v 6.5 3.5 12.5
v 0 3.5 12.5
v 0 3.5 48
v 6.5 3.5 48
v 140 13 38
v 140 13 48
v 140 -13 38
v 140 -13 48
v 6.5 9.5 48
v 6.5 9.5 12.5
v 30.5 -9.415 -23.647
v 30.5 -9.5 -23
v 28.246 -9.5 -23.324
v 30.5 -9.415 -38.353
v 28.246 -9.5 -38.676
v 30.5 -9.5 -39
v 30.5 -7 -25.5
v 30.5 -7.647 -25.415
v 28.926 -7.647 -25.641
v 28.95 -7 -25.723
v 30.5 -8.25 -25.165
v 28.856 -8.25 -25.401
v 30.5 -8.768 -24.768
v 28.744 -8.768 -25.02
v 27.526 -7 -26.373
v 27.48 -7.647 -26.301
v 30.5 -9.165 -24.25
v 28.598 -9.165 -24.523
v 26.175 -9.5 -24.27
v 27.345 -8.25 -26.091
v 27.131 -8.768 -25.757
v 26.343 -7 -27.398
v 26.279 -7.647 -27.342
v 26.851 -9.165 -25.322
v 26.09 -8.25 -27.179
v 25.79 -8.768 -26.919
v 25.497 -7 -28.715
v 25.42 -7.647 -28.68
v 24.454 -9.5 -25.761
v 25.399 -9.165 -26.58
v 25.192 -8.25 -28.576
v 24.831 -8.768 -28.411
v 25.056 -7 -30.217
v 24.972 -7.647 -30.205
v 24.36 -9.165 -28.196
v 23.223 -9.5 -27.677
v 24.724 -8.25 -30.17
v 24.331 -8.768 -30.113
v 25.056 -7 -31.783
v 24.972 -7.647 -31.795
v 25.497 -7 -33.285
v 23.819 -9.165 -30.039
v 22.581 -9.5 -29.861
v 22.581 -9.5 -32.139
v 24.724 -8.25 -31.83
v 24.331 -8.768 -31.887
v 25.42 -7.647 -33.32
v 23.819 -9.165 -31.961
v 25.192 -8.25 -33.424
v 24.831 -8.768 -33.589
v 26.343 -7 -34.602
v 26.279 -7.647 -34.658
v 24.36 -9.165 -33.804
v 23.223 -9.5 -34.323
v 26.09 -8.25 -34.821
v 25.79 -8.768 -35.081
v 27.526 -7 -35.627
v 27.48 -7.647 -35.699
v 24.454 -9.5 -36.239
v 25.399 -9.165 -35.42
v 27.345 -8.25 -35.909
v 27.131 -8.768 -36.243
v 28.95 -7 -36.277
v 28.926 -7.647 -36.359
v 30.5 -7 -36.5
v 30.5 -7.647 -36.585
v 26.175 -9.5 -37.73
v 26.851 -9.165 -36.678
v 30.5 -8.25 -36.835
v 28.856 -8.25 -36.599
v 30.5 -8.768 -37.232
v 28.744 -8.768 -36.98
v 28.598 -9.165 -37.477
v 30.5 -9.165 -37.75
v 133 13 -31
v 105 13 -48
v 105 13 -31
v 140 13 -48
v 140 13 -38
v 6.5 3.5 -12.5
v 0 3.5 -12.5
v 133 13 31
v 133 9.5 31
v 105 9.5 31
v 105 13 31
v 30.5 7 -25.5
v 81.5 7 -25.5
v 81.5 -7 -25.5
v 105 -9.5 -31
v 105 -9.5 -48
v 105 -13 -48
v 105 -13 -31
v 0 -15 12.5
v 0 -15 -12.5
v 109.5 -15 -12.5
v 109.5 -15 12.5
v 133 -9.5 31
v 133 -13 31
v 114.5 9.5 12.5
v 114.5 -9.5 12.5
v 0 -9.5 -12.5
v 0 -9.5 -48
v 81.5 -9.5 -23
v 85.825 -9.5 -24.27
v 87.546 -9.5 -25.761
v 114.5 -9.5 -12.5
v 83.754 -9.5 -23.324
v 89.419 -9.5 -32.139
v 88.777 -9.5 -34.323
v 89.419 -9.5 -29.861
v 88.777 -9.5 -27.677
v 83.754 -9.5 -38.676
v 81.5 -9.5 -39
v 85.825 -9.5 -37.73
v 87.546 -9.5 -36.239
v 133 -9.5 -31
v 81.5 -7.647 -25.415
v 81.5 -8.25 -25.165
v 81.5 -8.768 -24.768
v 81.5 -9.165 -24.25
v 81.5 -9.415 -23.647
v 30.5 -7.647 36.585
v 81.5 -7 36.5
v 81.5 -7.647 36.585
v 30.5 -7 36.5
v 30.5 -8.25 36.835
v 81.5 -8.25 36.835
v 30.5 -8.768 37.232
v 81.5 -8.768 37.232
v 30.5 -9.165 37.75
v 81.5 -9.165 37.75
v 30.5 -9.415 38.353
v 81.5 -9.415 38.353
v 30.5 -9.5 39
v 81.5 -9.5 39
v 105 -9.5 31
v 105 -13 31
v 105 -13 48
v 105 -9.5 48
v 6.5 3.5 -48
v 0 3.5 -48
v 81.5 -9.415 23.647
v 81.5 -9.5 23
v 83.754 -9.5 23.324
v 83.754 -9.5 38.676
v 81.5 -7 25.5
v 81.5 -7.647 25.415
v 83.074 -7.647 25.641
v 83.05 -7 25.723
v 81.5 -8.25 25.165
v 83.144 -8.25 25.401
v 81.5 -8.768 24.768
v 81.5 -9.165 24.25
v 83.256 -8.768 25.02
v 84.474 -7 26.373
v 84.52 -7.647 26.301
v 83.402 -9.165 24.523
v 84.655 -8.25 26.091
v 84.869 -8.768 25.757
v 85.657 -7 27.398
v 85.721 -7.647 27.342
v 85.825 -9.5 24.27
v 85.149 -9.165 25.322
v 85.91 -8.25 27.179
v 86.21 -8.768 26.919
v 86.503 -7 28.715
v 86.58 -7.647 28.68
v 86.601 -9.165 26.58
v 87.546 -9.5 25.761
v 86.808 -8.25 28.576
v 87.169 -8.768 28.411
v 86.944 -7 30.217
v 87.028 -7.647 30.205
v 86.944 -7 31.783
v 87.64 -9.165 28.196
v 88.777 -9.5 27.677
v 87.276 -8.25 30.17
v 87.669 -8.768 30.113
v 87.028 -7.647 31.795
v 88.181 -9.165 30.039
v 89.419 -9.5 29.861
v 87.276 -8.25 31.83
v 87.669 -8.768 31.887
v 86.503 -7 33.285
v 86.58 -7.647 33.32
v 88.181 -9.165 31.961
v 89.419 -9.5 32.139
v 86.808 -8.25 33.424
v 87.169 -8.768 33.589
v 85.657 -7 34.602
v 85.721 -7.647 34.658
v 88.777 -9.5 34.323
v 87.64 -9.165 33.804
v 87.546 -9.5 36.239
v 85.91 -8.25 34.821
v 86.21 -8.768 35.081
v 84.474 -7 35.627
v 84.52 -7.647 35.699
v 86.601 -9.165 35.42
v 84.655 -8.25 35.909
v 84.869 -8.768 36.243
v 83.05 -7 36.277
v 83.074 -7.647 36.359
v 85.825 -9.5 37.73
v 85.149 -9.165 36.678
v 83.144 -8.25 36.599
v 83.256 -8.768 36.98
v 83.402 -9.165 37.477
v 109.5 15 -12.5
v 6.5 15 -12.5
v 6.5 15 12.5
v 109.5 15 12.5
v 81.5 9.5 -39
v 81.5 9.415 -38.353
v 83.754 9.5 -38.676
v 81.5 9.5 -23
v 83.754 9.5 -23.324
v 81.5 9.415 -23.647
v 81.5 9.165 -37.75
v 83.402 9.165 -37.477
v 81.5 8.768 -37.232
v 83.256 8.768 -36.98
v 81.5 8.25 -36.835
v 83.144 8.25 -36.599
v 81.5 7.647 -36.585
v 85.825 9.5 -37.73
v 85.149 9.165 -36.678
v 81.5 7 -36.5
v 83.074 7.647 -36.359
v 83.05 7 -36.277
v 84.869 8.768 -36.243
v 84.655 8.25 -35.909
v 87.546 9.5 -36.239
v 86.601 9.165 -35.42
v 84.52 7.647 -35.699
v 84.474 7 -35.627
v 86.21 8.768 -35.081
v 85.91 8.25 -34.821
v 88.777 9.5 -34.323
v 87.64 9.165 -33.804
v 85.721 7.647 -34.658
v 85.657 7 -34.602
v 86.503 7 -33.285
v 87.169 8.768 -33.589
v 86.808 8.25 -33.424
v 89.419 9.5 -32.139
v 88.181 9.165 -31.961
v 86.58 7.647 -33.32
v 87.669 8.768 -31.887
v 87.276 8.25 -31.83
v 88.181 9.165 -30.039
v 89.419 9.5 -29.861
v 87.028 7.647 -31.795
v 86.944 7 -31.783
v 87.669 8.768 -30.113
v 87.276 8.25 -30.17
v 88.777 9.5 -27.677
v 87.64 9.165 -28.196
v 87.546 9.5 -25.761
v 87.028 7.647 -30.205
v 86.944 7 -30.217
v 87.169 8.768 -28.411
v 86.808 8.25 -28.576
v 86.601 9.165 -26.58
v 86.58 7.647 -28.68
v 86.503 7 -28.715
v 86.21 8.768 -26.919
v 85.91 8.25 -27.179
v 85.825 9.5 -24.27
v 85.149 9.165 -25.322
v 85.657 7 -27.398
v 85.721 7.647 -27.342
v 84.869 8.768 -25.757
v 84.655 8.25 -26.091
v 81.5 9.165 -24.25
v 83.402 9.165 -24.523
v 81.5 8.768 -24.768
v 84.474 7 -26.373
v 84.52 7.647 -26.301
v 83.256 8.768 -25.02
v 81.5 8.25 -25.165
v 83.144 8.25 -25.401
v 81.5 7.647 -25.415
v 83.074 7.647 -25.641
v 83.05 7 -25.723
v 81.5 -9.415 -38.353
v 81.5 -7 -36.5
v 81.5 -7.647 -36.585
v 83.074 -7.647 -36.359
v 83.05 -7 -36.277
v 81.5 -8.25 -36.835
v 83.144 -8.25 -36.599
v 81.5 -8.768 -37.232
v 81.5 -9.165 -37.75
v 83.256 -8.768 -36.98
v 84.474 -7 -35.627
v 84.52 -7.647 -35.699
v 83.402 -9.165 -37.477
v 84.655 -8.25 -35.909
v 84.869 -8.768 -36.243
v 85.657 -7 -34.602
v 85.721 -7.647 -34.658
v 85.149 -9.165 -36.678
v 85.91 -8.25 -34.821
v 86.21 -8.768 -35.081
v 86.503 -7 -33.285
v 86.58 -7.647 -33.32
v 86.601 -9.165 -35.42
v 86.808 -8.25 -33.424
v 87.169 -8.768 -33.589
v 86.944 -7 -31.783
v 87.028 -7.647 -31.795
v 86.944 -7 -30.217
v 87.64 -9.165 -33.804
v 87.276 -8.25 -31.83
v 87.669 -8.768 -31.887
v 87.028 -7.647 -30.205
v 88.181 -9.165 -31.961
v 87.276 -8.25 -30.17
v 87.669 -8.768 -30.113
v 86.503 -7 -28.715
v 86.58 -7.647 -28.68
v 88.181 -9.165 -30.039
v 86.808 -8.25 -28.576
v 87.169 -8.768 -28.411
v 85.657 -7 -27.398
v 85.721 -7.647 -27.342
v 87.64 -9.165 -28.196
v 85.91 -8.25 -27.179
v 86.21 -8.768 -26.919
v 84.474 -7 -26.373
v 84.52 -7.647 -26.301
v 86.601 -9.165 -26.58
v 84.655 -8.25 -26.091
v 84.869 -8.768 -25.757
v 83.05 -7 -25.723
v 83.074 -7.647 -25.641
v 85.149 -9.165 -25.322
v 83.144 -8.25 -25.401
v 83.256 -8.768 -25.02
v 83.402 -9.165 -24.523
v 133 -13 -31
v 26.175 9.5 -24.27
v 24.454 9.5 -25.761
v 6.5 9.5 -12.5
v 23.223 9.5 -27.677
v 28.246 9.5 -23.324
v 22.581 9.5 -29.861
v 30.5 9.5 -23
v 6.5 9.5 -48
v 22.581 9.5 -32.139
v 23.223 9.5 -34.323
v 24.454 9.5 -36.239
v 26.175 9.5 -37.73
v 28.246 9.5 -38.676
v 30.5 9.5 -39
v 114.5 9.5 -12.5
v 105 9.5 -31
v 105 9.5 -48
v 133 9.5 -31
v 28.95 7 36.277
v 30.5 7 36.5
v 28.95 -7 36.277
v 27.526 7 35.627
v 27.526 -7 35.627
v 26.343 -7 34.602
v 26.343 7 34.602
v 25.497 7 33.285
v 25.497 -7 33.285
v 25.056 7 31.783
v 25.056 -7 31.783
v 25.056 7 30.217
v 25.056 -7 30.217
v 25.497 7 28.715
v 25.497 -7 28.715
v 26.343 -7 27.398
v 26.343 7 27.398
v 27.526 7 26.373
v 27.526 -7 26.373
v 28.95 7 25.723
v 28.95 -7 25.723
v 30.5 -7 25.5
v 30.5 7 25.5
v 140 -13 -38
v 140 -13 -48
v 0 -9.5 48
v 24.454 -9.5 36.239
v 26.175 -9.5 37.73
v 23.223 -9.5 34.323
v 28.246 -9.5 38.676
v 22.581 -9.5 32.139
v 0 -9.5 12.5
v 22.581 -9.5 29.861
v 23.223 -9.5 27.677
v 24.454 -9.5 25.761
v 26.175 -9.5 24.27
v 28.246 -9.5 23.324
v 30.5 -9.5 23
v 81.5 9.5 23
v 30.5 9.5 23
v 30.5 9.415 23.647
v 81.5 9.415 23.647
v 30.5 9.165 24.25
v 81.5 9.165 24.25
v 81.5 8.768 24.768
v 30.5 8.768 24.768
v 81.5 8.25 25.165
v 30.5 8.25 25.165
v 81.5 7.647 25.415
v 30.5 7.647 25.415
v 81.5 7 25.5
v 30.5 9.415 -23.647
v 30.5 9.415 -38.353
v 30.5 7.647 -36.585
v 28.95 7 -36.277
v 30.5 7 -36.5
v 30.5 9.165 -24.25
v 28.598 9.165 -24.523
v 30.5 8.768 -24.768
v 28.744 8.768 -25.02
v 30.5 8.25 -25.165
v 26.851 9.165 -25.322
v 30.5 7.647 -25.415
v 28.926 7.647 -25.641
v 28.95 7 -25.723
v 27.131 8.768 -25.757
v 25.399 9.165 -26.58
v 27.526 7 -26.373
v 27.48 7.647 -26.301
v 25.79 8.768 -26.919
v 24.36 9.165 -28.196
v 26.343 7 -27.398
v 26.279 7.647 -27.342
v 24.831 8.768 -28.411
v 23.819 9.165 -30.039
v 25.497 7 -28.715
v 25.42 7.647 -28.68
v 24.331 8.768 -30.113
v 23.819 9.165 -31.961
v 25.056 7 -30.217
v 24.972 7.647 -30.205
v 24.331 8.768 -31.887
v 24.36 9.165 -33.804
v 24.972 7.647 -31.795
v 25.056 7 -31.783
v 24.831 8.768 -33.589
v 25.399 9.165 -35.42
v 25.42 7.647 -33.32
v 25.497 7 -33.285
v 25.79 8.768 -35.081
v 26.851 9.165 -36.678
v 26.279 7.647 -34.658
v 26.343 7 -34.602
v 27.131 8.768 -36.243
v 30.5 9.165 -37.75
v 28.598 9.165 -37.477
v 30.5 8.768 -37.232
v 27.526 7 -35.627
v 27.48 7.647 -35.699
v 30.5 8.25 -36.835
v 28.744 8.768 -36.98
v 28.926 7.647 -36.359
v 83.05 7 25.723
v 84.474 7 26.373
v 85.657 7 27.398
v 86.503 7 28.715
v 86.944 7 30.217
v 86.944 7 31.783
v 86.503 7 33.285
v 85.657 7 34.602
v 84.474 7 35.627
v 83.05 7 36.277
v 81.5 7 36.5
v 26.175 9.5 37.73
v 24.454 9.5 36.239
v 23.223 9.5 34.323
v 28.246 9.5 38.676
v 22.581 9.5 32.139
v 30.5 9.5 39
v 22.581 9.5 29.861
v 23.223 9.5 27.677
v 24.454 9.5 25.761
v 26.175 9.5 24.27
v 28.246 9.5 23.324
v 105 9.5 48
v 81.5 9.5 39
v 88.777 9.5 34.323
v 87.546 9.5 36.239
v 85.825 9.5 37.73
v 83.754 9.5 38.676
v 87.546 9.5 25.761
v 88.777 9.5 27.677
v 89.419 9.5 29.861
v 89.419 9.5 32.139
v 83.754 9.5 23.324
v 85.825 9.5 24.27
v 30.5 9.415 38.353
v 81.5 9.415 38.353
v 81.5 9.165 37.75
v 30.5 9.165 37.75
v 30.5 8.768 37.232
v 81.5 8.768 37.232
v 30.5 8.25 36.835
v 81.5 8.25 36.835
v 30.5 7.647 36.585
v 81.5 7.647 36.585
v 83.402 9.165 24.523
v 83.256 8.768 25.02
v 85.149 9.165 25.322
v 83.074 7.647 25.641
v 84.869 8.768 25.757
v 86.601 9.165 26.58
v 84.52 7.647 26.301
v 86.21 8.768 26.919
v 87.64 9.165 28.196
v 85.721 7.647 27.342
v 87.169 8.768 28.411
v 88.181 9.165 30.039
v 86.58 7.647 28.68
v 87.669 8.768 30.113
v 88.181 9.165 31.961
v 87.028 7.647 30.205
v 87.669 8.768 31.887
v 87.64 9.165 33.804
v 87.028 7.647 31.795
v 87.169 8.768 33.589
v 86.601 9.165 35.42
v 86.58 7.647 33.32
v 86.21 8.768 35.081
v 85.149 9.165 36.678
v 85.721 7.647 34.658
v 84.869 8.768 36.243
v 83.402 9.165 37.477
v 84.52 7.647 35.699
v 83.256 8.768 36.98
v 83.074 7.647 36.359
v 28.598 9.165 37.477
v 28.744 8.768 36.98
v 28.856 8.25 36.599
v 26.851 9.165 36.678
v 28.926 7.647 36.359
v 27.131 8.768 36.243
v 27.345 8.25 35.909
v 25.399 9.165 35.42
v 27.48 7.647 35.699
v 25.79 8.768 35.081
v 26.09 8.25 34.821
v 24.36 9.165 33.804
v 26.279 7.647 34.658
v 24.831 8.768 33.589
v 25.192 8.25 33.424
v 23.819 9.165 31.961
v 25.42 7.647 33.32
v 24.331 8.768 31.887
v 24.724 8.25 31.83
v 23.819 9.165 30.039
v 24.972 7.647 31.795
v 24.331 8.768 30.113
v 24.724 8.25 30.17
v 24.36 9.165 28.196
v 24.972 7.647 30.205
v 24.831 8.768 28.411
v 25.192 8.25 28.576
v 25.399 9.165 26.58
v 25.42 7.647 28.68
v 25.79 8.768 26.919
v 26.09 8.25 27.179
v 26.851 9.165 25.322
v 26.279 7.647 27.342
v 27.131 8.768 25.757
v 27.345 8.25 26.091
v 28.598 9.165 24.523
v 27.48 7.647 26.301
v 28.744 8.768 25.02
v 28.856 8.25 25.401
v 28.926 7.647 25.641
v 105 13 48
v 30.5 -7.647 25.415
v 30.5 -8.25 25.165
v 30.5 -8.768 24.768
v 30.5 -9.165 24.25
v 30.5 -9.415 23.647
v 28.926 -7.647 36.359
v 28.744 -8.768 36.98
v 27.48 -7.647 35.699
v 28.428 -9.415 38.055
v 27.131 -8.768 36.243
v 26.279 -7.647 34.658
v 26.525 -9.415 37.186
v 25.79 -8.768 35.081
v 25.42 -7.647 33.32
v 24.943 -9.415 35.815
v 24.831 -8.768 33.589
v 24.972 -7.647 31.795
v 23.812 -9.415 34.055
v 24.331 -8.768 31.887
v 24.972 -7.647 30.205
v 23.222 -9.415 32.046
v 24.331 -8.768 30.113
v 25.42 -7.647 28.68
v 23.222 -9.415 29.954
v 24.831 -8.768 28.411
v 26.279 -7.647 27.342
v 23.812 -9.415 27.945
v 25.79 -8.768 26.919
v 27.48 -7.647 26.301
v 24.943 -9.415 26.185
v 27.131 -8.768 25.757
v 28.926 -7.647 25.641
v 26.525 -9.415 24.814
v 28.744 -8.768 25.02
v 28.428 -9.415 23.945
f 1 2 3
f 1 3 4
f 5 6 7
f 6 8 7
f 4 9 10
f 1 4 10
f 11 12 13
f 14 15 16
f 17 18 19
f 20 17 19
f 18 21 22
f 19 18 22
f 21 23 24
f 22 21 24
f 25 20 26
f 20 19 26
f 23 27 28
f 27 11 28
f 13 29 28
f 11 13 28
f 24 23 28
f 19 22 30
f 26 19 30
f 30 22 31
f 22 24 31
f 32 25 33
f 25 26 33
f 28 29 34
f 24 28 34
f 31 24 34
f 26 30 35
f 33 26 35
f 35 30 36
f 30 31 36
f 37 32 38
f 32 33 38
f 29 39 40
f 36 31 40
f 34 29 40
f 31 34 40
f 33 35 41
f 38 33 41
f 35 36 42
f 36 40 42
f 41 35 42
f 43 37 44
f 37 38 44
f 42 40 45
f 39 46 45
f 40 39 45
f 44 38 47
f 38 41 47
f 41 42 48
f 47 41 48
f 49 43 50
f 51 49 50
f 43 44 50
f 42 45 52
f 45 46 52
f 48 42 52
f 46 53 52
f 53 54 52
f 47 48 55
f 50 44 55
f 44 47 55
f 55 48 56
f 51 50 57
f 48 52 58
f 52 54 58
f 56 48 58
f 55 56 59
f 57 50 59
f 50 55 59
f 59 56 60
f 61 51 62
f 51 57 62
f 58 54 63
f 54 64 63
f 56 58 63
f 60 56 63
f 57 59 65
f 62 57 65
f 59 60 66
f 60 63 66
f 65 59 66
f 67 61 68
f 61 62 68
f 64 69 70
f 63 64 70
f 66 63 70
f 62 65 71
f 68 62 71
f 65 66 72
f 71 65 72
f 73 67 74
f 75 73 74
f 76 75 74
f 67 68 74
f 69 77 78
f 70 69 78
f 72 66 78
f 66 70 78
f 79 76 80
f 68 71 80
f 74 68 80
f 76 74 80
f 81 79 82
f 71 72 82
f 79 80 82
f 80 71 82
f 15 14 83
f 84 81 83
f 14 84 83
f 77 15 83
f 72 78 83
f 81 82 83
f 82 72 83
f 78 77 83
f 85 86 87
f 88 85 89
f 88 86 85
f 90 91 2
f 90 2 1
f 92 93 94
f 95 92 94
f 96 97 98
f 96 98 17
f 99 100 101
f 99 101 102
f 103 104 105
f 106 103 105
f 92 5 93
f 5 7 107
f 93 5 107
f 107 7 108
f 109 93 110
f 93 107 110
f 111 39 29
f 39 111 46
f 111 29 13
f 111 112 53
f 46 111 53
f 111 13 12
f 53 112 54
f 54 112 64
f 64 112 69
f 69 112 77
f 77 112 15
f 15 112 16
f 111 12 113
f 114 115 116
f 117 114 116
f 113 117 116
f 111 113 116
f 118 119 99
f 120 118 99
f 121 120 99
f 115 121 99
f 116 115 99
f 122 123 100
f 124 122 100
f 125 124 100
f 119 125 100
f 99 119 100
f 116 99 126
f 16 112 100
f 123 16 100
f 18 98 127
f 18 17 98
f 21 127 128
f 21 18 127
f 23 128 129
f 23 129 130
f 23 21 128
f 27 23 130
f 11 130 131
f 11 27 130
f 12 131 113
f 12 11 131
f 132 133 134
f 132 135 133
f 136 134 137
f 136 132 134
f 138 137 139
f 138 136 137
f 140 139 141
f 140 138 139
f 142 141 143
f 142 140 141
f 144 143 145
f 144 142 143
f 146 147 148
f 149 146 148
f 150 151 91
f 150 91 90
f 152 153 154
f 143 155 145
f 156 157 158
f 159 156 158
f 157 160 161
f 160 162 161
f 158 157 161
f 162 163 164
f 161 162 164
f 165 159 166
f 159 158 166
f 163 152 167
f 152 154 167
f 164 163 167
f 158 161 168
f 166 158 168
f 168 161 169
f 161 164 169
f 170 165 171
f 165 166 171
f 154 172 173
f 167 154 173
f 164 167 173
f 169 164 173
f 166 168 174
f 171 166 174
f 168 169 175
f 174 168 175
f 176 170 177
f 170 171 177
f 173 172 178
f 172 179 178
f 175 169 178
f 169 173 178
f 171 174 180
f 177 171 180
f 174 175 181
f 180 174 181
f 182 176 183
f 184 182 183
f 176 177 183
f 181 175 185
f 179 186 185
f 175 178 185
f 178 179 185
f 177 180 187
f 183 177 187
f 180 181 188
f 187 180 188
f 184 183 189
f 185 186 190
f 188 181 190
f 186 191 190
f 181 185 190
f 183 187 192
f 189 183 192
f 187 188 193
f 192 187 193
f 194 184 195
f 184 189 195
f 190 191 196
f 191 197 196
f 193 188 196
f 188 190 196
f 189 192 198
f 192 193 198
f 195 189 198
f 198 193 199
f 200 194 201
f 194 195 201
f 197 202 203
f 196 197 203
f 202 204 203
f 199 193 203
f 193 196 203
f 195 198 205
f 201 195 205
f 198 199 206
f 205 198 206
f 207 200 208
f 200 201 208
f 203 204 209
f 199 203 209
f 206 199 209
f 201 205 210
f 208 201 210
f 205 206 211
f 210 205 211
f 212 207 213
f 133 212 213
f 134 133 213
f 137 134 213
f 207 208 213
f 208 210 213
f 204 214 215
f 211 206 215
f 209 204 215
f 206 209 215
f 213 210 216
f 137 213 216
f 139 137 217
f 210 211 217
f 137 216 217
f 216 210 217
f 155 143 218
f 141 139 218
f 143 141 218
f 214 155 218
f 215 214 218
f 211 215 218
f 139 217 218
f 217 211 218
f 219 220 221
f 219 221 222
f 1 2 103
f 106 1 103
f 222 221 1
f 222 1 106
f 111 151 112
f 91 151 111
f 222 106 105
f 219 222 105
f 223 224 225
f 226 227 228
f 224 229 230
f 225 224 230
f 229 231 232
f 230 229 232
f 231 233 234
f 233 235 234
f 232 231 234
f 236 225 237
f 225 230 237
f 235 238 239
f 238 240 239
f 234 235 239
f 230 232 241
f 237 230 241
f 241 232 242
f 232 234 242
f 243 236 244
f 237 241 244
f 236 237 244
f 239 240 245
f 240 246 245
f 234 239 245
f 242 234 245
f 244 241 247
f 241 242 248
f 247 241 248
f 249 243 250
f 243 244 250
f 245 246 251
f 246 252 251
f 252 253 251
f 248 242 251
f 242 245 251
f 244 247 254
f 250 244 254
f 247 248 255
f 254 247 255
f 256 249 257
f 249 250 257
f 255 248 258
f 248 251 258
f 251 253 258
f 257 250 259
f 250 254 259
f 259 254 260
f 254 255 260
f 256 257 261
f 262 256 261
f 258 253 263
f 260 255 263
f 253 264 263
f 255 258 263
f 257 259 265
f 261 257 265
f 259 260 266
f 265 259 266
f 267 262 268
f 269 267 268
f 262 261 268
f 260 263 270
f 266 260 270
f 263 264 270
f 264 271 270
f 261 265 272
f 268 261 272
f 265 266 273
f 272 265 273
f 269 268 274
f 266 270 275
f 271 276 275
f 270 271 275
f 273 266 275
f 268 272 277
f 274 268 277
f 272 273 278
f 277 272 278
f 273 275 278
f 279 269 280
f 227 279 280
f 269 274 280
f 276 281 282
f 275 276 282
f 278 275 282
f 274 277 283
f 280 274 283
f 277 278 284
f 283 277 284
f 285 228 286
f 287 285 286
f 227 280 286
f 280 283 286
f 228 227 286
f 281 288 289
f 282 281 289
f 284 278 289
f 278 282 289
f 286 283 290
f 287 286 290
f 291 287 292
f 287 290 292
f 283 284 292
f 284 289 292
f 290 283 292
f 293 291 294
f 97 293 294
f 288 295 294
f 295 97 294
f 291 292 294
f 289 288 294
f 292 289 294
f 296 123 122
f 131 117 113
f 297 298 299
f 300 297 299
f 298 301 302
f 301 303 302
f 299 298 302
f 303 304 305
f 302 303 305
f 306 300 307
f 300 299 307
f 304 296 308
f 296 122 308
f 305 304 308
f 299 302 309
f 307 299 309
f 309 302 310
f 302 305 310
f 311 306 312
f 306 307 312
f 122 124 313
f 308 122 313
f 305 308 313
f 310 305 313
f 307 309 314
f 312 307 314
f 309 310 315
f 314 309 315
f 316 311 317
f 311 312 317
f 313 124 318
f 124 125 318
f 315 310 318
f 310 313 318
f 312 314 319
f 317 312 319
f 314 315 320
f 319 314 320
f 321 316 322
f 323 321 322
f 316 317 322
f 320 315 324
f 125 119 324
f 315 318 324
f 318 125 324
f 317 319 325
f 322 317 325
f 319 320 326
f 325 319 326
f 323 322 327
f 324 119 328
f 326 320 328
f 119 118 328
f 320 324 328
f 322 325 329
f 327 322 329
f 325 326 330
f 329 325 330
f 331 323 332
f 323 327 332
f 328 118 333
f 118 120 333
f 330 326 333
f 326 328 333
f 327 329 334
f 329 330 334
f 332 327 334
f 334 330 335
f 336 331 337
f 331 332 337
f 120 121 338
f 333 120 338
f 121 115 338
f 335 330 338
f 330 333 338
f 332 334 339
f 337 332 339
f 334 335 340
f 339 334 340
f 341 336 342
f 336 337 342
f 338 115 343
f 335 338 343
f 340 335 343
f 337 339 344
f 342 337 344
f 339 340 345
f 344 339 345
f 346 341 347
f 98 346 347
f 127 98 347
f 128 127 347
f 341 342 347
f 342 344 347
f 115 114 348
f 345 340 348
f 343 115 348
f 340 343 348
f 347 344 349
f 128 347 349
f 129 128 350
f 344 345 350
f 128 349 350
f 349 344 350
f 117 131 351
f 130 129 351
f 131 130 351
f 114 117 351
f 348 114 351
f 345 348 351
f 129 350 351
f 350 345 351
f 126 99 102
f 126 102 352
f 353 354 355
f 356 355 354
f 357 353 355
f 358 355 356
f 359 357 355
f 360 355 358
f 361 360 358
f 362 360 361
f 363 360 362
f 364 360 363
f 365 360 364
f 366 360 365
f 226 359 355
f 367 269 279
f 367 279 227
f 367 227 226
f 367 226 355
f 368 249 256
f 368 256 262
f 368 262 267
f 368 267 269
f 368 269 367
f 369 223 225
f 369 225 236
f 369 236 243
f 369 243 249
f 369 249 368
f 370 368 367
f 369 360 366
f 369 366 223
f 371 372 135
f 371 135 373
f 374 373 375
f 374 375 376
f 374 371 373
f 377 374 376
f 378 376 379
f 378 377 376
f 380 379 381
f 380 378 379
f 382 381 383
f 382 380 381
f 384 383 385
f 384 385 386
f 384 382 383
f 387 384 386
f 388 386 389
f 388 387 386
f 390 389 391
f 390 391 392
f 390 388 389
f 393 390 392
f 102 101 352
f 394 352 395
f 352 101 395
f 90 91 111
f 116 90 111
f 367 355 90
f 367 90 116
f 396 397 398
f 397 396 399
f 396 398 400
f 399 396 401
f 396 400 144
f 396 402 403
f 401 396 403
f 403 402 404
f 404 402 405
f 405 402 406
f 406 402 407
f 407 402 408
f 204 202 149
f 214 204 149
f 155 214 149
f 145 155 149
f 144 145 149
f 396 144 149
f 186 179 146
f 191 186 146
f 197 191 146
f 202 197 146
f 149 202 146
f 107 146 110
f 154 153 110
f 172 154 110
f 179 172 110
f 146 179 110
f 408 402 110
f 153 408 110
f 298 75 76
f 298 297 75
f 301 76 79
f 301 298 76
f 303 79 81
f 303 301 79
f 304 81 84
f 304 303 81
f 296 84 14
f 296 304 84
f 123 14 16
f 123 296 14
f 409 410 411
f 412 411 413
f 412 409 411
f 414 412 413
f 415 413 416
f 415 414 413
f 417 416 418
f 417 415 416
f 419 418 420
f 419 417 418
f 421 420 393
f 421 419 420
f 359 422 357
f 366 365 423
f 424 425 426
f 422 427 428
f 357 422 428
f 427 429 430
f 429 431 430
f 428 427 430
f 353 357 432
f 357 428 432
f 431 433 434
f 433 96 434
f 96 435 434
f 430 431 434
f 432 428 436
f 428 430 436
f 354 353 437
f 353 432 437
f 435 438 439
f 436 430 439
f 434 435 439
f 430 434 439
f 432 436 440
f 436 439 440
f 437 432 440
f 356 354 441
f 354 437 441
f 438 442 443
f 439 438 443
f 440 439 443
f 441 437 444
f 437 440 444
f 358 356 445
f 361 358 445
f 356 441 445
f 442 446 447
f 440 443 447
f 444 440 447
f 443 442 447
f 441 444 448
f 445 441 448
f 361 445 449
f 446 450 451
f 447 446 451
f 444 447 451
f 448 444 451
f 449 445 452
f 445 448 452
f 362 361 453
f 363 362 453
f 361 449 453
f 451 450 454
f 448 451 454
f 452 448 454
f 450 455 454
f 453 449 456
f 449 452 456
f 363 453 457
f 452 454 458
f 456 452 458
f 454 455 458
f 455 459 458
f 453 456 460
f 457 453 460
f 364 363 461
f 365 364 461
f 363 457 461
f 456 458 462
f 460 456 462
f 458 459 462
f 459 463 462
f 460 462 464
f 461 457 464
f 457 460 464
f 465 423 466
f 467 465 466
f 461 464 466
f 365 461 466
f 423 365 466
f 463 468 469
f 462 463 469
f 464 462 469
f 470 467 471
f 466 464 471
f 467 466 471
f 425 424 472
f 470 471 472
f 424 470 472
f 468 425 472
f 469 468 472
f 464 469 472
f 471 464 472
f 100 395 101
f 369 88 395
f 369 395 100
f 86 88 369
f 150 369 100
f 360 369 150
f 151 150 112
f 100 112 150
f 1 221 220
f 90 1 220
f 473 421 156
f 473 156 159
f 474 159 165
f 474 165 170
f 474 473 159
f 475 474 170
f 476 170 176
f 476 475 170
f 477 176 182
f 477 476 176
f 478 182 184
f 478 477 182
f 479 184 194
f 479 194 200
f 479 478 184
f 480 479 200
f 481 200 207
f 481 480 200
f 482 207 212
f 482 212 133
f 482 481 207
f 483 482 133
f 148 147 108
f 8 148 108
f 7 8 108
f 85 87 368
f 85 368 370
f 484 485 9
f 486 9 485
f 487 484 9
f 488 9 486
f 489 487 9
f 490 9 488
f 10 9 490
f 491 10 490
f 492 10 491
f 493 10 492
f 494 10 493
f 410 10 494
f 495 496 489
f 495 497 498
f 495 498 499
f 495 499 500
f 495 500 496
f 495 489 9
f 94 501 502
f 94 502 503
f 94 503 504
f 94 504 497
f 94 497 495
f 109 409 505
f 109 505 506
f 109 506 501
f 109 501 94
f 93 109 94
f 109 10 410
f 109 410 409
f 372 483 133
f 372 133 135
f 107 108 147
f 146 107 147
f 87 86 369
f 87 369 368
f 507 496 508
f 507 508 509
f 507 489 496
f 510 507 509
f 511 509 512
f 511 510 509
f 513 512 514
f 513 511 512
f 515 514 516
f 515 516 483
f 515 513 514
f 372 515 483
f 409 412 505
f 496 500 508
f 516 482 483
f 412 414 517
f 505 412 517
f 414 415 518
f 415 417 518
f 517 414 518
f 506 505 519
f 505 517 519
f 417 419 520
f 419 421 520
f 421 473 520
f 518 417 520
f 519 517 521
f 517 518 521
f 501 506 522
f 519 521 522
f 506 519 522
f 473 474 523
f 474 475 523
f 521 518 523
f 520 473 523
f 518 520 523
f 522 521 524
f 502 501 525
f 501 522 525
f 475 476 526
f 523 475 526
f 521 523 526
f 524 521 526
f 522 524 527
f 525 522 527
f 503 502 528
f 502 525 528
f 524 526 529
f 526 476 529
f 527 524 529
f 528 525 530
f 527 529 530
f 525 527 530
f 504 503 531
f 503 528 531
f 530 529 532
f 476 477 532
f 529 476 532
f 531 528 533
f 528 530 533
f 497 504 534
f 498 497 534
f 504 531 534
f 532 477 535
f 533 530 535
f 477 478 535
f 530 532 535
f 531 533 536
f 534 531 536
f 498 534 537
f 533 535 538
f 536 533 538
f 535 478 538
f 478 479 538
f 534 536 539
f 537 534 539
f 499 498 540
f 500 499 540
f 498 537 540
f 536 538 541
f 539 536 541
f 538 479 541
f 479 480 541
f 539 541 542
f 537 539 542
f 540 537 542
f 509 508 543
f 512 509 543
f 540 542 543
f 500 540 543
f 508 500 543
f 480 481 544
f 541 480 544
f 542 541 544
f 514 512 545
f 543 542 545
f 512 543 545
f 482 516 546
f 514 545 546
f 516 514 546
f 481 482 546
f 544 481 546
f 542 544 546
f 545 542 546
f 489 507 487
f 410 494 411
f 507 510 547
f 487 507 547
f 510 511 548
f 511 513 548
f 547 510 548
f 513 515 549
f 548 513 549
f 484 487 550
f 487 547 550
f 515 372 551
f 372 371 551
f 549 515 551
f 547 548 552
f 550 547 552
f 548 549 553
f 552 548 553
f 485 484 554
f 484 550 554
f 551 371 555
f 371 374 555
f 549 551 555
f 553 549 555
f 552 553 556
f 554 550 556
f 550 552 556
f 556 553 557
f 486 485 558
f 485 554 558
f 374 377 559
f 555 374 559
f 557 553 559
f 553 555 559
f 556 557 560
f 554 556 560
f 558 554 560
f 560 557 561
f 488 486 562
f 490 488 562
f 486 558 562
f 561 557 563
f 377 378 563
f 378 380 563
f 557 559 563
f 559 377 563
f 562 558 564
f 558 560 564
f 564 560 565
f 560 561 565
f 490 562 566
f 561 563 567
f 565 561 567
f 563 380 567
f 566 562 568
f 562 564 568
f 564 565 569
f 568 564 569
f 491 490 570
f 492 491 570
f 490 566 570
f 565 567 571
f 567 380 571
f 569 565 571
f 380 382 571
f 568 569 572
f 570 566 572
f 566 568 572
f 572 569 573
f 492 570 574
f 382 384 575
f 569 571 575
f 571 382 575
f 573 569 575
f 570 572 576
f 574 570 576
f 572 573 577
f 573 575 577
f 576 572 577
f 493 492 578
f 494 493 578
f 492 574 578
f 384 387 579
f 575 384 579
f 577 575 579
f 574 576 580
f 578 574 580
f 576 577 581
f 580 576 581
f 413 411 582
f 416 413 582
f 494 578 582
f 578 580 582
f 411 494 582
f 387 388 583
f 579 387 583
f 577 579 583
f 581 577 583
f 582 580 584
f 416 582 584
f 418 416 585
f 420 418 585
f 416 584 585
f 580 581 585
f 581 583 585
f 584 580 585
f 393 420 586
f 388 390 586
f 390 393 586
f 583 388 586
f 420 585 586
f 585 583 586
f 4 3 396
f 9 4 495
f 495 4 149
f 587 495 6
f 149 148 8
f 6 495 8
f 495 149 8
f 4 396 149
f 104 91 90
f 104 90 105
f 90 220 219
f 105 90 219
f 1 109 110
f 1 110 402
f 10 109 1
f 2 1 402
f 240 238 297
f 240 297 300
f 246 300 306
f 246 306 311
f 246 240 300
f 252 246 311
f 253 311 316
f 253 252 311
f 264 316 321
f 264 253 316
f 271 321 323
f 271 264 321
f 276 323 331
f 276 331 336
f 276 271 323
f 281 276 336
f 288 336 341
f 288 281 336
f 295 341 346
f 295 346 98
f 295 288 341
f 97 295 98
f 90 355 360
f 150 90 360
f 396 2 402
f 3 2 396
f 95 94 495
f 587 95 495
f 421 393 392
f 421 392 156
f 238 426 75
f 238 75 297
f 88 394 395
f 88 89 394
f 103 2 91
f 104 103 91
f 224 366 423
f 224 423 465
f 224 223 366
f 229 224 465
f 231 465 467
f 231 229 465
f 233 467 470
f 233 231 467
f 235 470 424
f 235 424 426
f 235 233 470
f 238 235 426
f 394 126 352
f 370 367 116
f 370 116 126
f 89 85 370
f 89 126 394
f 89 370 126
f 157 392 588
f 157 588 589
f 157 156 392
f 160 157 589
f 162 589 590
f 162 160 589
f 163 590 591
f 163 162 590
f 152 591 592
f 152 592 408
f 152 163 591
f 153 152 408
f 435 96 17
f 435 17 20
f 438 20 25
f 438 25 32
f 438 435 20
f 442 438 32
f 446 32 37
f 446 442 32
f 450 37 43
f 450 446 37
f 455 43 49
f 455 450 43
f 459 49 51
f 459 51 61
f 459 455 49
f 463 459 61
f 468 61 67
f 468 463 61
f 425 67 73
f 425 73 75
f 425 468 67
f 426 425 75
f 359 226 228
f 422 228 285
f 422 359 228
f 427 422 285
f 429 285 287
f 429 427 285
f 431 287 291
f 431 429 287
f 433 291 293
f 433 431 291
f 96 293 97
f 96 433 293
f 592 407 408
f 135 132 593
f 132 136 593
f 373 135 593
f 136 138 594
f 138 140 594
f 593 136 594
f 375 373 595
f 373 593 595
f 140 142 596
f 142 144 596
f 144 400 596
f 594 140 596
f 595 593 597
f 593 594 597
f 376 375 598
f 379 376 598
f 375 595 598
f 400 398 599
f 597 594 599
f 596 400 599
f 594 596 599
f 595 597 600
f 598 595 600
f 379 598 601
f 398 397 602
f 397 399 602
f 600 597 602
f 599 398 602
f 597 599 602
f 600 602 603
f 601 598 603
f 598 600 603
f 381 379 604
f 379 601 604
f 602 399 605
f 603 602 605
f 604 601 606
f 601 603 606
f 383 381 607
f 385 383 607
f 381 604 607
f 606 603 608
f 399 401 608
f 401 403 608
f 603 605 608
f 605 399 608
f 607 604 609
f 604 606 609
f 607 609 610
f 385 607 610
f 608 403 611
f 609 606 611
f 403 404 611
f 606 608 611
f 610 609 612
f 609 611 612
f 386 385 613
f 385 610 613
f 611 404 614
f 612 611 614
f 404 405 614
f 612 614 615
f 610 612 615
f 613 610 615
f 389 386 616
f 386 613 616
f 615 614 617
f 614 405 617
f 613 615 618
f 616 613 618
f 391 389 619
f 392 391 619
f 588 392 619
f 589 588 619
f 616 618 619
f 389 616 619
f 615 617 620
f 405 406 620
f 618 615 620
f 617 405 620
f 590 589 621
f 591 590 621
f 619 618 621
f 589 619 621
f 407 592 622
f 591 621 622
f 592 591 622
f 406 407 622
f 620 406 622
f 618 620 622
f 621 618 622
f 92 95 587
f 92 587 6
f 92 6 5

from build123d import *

# Parameters (mm, degrees)
SKETCH1_W             = 109.5
SKETCH1_H             = 25
BOSS_EXTRUDE1_DEPTH   = 15
BOSS_EXTRUDE2_DEPTH   = 9.5
BOSS_EXTRUDE2_2_DEPTH = 9.5
BOSS_EXTRUDE3_DEPTH   = 13
FILLET1_R             = 2.5
FILLET2_R             = 2.5
FILLET3_R             = 2.5
FILLET4_R             = 2.5
SKETCH2_W             = 6.5
SKETCH2_H             = 96
CUT_EXTRUDE1_DEPTH    = 11.5


with BuildPart() as part:
    # Sketch1 → Boss-Extrude1 (new, symmetric)
    with BuildSketch(Plane(origin=(0, 0, 0), x_dir=(1, 0, 0), z_dir=(0, 1, 0))):
        with Locations((54.75, 0)):
            Rectangle(SKETCH1_W, SKETCH1_H)
    extrude(amount=BOSS_EXTRUDE1_DEPTH, both=True)


with BuildPart() as body_2:
    # Sketch1<3> → Boss-Extrude2 (new, symmetric)
    with BuildSketch(Plane(origin=(0, 0, 0), x_dir=(1, 0, 0), z_dir=(0, 1, 0))):
        Polygon((105, 48), (0, 48), (0, 12.5), (114.5, 12.5), (133, 31), (105, 31), align=None)
        with BuildLine():
            Line((81.5, 25.5), (30.5, 25.5))
            ThreePointArc((30.5, 25.5), (25, 31), (30.5, 36.5))
            Line((30.5, 36.5), (81.5, 36.5))
            ThreePointArc((81.5, 36.5), (87, 31), (81.5, 25.5))
        make_face(mode=Mode.SUBTRACT)
    extrude(amount=BOSS_EXTRUDE2_DEPTH, both=True)



with BuildPart() as body_3:
    # Sketch1<3> → Boss-Extrude2 2 (new, symmetric)
    with BuildSketch(Plane(origin=(0, 0, 0), x_dir=(1, 0, 0), z_dir=(0, 1, 0))):
        Polygon((114.5, -12.5), (0, -12.5), (0, -48), (105, -48), (105, -31), (133, -31), align=None)
        with BuildLine():
            ThreePointArc((30.5, -36.5), (25, -31), (30.5, -25.5))
            Line((30.5, -25.5), (81.5, -25.5))
            ThreePointArc((81.5, -25.5), (87, -31), (81.5, -36.5))
            Line((81.5, -36.5), (30.5, -36.5))
        make_face(mode=Mode.SUBTRACT)
    extrude(amount=BOSS_EXTRUDE2_2_DEPTH, both=True)


with BuildPart() as body_2_1:
    add(body_2.part)

    add(body_3.part)  # Boss-Extrude3 merges body 3
    # Sketch1<4> → Boss-Extrude3 (add, symmetric)
    with BuildSketch(Plane(origin=(0, 0, 0), x_dir=(1, 0, 0), z_dir=(0, 1, 0))):
        Polygon((140, 48), (105, 48), (105, 31), (133, 31), (140, 38), align=None)
        Polygon((105, -31), (105, -48), (140, -48), (140, -38), (133, -31), align=None)
    extrude(amount=BOSS_EXTRUDE3_DEPTH, both=True)

    # Fillet1
    fillet1_edges = [body_2_1.edges().sort_by_distance(p)[0] for p in [
        (25, 9.5, -31),
        (87, 9.5, -31),
        (56, 9.5, -25.5),
        (56, 9.5, -36.5),
    ]]
    fillet(fillet1_edges, radius=FILLET1_R)

    # Fillet2
    fillet2_edges = [body_2_1.edges().sort_by_distance(p)[0] for p in [
        (25, 9.5, 31),
        (87, 9.5, 31),
        (56, 9.5, 36.5),
        (56, 9.5, 25.5),
    ]]
    fillet(fillet2_edges, radius=FILLET2_R)

    # Fillet3
    fillet3_edges = [body_2_1.edges().sort_by_distance(p)[0] for p in [
        (87, -9.5, -31),
        (25, -9.5, -31),
        (56, -9.5, -25.5),
        (56, -9.5, -36.5),
    ]]
    fillet(fillet3_edges, radius=FILLET3_R)

    # Fillet4
    fillet4_edges = [body_2_1.edges().sort_by_distance(p)[0] for p in [
        (87, -9.5, 31),
        (25, -9.5, 31),
        (56, -9.5, 36.5),
        (56, -9.5, 25.5),
    ]]
    fillet(fillet4_edges, radius=FILLET4_R)


with BuildPart() as cut_extrude1_tool:
    # Sketch2 → Cut-Extrude1 (new body)
    with BuildSketch(Plane(origin=(0, 15, 0), x_dir=(1, 0, 0), z_dir=(0, 1, 0))):
        with Locations((3.25, 0)):
            Rectangle(SKETCH2_W, SKETCH2_H)
    extrude(amount=-CUT_EXTRUDE1_DEPTH)


with BuildPart() as part_1:
    add(part.part)

    # Cut-Extrude1: cut by cut_extrude1_tool
    add(cut_extrude1_tool.part, mode=Mode.SUBTRACT)


with BuildPart() as body_2_2:
    add(body_2_1.part)

    # Cut-Extrude1: cut by cut_extrude1_tool
    add(cut_extrude1_tool.part, mode=Mode.SUBTRACT)


solid = Compound([part_1.part, body_2_2.part])
